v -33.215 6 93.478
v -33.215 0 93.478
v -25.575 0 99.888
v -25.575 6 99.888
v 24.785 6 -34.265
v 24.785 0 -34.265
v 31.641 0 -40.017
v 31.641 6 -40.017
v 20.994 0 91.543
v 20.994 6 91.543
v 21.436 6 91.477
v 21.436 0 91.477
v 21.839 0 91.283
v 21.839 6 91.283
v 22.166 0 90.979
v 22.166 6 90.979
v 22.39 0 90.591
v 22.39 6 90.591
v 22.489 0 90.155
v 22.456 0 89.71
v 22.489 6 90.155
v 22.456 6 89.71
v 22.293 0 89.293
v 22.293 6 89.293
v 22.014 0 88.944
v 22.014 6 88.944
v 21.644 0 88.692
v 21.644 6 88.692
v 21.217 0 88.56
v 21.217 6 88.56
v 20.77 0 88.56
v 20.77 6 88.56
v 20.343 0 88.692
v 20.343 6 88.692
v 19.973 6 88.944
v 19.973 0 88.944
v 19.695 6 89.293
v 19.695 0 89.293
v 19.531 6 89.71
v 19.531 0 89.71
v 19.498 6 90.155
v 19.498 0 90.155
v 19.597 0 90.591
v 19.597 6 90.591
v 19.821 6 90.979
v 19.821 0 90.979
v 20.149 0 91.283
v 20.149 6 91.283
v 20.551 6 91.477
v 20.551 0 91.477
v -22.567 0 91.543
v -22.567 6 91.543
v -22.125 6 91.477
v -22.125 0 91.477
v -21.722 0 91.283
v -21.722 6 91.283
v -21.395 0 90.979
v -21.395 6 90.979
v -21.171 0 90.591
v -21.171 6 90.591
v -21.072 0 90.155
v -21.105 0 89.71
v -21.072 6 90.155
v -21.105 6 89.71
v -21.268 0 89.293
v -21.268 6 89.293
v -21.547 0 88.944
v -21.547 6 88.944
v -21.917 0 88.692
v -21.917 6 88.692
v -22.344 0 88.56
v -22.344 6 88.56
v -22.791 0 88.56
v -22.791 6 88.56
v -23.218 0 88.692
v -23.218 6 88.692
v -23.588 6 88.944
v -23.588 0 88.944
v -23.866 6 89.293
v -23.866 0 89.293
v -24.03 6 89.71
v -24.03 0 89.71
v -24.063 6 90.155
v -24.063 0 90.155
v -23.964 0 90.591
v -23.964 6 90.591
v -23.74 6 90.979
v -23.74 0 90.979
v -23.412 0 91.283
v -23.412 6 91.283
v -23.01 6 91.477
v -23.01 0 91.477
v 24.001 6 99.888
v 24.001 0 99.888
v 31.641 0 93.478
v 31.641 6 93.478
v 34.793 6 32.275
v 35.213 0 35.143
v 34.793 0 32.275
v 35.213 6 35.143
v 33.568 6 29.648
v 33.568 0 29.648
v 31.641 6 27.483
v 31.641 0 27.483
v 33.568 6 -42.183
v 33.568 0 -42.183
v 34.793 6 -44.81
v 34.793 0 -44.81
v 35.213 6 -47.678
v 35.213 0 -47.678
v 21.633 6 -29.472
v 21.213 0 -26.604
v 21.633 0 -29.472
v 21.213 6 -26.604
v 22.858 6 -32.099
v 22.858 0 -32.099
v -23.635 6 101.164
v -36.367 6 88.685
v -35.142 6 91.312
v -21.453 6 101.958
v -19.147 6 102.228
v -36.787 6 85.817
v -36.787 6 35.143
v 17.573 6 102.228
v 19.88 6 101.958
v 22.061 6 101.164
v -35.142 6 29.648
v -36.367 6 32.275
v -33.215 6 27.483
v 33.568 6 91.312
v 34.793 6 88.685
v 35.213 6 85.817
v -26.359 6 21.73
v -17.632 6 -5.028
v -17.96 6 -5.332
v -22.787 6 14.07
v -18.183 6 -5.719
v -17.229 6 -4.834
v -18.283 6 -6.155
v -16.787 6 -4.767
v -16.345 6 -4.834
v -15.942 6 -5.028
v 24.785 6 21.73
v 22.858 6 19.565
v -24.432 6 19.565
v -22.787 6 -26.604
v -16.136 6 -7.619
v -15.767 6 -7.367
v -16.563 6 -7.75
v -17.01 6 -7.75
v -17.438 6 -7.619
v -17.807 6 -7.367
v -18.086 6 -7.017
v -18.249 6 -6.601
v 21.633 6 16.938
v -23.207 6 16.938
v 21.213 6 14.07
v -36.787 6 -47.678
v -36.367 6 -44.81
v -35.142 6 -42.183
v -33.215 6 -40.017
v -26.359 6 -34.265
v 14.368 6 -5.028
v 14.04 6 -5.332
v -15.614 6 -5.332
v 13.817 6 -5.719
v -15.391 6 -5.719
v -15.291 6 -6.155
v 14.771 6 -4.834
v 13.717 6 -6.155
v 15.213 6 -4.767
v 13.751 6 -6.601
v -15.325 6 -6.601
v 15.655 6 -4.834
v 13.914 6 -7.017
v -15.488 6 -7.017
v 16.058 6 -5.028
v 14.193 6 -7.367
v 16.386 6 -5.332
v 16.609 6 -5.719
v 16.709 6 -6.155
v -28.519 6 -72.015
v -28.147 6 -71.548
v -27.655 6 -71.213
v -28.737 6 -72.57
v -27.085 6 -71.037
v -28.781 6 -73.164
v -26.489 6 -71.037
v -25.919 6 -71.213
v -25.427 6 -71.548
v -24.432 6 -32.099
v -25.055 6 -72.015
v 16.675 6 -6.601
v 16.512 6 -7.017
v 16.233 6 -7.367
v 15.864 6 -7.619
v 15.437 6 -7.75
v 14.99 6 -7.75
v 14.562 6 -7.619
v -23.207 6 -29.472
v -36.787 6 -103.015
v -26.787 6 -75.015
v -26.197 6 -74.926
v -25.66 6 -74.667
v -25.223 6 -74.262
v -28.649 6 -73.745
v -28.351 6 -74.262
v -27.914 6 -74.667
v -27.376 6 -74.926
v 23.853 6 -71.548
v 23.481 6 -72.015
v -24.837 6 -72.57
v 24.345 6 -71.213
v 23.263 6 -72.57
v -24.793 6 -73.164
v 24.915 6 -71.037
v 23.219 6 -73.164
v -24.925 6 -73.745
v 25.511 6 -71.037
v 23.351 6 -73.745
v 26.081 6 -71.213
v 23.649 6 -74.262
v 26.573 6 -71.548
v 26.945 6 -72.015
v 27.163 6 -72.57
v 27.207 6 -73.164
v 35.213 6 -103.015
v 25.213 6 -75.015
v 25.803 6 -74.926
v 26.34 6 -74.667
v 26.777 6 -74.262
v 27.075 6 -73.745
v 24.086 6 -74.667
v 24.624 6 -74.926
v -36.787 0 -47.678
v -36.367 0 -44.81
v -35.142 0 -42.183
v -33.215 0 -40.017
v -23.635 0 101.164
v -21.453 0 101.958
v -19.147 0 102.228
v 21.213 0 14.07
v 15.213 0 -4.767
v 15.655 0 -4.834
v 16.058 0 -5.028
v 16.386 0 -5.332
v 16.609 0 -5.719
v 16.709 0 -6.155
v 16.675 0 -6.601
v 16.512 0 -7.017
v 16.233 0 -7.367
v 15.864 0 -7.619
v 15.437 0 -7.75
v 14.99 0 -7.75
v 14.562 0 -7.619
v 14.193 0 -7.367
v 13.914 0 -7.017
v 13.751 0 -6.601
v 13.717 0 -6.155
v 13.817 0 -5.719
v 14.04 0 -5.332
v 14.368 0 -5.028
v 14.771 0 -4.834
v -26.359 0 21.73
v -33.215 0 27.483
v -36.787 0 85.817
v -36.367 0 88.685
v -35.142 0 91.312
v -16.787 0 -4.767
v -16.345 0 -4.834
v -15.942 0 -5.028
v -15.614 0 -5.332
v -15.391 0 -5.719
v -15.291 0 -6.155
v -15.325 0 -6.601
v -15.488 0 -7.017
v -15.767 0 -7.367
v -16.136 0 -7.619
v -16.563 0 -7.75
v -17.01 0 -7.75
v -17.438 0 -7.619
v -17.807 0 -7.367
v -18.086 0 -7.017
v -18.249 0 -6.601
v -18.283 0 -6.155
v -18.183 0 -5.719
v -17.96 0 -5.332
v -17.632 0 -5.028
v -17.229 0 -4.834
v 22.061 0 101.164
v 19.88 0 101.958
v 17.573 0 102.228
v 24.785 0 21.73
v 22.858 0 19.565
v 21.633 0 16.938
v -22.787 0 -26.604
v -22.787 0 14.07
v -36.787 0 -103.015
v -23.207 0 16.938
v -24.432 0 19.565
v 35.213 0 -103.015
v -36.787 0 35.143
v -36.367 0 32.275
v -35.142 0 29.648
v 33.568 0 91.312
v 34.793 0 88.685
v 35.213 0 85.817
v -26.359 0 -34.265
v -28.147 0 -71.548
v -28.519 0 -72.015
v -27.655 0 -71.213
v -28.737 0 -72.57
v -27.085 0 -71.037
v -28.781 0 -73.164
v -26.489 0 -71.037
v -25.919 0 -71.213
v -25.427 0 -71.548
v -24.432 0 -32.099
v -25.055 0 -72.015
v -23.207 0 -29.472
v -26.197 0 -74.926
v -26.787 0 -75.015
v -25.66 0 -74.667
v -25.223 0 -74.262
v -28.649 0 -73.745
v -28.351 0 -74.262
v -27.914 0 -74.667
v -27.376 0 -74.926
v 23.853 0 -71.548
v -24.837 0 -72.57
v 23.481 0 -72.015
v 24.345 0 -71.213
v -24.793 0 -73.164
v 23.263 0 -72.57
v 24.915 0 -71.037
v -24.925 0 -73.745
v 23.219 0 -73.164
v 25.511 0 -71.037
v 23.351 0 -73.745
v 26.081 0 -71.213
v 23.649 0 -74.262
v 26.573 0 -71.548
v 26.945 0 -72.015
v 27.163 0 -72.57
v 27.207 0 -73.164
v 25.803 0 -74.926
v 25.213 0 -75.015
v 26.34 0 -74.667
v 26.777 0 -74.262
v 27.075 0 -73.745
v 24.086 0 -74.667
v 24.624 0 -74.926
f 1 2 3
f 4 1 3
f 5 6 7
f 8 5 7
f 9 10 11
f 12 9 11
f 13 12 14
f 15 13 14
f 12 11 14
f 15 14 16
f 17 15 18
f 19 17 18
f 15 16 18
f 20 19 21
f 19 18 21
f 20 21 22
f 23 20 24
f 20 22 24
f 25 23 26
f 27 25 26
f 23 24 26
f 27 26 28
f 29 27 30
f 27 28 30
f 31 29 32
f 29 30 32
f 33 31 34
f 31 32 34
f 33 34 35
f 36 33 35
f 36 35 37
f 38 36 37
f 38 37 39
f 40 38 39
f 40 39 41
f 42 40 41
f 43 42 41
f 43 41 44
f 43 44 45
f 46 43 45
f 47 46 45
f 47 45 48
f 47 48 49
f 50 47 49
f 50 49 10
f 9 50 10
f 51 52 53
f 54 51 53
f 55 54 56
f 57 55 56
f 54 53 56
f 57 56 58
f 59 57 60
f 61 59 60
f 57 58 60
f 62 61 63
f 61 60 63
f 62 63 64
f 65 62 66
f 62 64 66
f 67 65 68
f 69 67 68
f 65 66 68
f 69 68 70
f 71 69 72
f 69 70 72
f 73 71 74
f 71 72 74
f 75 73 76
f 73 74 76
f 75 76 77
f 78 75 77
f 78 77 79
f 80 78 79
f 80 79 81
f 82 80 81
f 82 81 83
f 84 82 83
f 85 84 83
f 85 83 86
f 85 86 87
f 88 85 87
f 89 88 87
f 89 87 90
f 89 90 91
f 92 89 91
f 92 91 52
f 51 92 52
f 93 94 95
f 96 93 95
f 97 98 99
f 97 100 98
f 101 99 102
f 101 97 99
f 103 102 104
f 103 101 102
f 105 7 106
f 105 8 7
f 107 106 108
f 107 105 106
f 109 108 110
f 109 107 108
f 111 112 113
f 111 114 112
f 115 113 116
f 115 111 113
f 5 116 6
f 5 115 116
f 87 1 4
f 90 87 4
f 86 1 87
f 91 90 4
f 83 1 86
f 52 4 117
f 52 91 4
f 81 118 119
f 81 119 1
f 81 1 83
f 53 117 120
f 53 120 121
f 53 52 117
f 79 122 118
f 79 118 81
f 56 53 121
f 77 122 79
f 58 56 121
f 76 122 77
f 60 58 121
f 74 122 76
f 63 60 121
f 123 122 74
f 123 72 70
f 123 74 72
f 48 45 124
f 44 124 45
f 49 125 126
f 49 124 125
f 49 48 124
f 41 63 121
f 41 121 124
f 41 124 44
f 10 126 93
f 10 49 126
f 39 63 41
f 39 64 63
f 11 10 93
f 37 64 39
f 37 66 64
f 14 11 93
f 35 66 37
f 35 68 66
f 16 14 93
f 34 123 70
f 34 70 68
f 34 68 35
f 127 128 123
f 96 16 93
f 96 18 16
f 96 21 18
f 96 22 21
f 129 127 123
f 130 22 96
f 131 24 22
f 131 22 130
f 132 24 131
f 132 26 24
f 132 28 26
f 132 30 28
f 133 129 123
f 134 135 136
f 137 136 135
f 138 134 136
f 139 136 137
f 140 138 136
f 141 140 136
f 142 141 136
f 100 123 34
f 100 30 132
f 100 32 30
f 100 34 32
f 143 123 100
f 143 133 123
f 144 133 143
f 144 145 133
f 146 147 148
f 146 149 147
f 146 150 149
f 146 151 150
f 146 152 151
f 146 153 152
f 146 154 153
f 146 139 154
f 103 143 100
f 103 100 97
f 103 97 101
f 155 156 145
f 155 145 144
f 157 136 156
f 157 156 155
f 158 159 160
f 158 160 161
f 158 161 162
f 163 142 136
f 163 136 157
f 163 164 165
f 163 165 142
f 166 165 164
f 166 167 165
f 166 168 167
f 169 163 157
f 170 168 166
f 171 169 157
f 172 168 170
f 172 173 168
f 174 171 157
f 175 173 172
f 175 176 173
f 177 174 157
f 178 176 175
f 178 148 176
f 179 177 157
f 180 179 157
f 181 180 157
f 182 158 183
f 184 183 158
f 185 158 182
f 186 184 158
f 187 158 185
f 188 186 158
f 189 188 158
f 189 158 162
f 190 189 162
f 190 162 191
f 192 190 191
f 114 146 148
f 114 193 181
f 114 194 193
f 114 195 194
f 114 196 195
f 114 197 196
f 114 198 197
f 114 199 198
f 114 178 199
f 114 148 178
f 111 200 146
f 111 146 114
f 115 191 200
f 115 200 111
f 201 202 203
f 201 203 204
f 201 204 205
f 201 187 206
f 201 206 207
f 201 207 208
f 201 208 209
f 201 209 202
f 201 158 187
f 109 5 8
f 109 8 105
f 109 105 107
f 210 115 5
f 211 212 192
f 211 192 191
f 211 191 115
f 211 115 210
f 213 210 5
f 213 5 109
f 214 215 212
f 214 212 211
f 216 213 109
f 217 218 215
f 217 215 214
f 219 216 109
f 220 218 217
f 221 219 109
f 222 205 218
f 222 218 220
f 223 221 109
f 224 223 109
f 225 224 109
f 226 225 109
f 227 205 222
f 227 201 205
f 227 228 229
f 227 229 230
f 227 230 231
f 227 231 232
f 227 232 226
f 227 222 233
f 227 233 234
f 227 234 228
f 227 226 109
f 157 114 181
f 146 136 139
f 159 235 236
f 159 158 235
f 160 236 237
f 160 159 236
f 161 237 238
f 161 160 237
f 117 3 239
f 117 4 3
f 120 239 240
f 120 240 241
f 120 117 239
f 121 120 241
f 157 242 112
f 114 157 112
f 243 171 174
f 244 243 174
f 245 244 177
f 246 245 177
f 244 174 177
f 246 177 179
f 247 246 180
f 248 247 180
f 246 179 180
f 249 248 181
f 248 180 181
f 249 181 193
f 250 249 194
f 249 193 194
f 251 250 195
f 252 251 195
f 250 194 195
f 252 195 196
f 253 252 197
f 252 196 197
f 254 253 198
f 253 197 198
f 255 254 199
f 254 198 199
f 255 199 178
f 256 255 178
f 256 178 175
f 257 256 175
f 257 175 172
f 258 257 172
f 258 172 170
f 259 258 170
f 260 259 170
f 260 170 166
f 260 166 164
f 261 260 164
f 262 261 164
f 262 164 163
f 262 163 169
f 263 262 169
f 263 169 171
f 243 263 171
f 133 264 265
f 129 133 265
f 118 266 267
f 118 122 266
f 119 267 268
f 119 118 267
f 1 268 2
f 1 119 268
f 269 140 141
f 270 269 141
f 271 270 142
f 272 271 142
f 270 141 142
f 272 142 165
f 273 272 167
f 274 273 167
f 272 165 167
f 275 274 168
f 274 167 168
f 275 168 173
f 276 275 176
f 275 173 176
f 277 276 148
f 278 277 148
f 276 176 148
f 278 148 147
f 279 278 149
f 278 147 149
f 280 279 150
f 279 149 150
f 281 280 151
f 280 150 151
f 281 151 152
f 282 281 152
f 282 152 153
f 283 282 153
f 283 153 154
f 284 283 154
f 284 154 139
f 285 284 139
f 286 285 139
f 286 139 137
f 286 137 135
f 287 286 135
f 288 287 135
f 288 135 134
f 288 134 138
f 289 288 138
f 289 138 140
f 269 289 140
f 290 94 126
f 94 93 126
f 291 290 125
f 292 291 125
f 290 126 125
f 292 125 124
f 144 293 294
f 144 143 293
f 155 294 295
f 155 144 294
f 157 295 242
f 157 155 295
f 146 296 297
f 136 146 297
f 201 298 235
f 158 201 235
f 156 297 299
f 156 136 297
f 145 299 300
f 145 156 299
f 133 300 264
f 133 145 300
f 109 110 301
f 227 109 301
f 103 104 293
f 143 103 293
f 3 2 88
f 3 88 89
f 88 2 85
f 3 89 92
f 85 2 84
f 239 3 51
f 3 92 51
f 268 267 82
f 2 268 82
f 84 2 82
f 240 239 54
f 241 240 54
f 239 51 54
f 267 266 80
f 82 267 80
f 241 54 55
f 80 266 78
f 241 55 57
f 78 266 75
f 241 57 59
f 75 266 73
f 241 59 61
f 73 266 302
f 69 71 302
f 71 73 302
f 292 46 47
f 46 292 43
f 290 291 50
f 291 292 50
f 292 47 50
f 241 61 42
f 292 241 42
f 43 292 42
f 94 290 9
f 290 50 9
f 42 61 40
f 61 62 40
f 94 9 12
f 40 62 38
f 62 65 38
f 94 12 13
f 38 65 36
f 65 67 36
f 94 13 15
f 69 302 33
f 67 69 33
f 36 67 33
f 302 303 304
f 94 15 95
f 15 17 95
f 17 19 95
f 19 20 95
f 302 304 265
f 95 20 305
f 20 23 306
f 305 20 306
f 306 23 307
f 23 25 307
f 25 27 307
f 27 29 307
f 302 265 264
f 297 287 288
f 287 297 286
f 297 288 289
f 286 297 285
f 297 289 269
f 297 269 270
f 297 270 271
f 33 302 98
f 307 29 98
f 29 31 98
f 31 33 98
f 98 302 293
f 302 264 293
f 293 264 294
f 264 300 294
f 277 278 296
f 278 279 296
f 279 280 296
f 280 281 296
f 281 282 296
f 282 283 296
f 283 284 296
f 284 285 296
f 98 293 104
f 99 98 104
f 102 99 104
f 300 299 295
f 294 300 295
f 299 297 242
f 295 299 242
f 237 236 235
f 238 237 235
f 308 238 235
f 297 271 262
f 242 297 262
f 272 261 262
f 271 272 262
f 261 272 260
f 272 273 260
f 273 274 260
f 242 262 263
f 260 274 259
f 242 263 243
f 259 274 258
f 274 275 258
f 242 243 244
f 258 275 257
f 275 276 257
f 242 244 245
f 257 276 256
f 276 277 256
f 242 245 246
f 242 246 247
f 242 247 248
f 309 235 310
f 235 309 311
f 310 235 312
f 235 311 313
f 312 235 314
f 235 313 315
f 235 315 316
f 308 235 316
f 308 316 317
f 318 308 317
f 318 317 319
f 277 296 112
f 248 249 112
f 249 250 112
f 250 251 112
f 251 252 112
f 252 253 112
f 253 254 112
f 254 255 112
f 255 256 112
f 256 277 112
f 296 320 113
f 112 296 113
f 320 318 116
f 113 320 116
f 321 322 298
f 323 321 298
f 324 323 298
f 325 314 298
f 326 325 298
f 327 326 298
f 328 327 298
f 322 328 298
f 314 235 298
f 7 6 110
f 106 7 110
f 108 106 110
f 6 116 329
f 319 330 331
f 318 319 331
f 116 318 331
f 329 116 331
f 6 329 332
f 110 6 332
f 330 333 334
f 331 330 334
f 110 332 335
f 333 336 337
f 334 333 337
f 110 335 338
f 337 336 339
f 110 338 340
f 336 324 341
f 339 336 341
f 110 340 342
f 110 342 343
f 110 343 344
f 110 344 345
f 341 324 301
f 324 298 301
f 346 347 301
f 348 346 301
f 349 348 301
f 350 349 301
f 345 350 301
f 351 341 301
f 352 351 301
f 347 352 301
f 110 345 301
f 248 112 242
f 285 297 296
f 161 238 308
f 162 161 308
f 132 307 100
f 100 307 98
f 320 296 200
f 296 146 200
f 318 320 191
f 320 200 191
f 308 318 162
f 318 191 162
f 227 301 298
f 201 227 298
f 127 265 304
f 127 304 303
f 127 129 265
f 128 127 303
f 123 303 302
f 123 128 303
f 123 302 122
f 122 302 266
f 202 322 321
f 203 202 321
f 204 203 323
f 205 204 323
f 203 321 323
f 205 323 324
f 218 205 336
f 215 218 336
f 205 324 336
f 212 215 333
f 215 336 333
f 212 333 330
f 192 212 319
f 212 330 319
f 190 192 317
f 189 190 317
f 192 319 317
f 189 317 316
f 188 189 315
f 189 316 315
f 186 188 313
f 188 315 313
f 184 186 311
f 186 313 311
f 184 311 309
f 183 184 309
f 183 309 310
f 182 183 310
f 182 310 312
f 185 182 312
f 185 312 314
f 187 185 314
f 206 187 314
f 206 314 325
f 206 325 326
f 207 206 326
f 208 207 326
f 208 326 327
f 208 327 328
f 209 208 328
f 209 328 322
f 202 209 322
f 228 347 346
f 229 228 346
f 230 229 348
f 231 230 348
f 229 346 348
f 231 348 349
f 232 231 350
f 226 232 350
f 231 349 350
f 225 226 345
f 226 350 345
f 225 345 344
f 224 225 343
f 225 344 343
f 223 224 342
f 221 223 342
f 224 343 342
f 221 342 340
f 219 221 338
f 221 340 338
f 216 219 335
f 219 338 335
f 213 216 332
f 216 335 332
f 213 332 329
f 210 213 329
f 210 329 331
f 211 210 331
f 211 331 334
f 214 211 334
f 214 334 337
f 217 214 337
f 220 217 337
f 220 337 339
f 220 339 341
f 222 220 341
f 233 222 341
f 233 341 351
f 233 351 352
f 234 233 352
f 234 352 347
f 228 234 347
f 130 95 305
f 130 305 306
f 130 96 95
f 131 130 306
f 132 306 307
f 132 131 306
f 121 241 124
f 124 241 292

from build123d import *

# Parameters (mm, degrees)
BOSS_EXTRUDE1_DEPTH = 6
FILLET1_R           = 10
SKETCH2_R           = 2.5
CUT_EXTRUDE1_DEPTH  = 6
SKETCH5_R           = 5.997593501
BOSS_EXTRUDE2_DEPTH = 6
FILLET2_R           = 10
SKETCH6_R           = 1.5
CUT_EXTRUDE2_DEPTH  = 10
SKETCH7_R           = 1.5
CUT_EXTRUDE3_DEPTH  = 10
SKETCH8_R           = 2
CUT_EXTRUDE4_DEPTH  = 10


with BuildPart() as part:
    # Sketch1 → Boss-Extrude1 (new body)
    with BuildSketch(Plane(origin=(0, 0, 0), x_dir=(1, 0, 0), z_dir=(0, 1, 0))):
        Polygon((21.213083016, -102.227633762), (35.213083016, -90.480238926), (35.213083016, -30.480238926), (21.213083016, -18.73284409), (21.213083016, 31.26715591), (35.213083016, 43.014550747), (35.213083016, 103.014550747), (-36.786916984, 103.014550747), (-36.786916984, 43.014550747), (-22.786916984, 31.26715591), (-22.786916984, -18.73284409), (-36.786916984, -30.480238926), (-36.786916984, -90.480238926), (-22.786916984, -102.227633762), align=None)
    extrude(amount=BOSS_EXTRUDE1_DEPTH)

    # Fillet1
    fillet1_edges = [part.edges().sort_by_distance(p)[0] for p in [
        (-22.786916984, 3, 102.227633762),
        (-36.786916984, 3, 90.480238926),
        (-36.786916984, 3, 30.480238926),
        (-22.786916984, 3, 18.73284409),
        (21.213083016, 3, 18.73284409),
        (35.213083016, 3, 30.480238926),
        (35.213083016, 3, 90.480238926),
        (21.213083016, 3, 102.227633762),
    ]]
    fillet(fillet1_edges, radius=FILLET1_R)

    # Sketch2 → Cut-Extrude1 (cut)
    with BuildSketch(Plane.XZ):
        with Locations(Location((-0.786916984, 60.480238926, 0), (0, 0, 270))):
            Circle(SKETCH2_R)
    extrude(amount=-CUT_EXTRUDE1_DEPTH, mode=Mode.SUBTRACT)

    # Sketch5 → Boss-Extrude2 (add)
    with BuildSketch(Plane.XZ):
        with Locations((-0.786916984, 60.480238926)):
            Circle(SKETCH5_R)
    extrude(amount=-BOSS_EXTRUDE2_DEPTH)

    # Fillet2
    fillet2_edges = [part.edges().sort_by_distance(p)[0] for p in [
        (-22.786916984, 3, -31.26715591),
        (-36.786916984, 3, -43.014550747),
        (35.213083016, 3, -43.014550747),
        (21.213083016, 3, -31.26715591),
    ]]
    fillet(fillet2_edges, radius=FILLET2_R)

    # Sketch6 → Cut-Extrude2 (cut)
    with BuildSketch(Plane(origin=(0, 6, 0), x_dir=(1, 0, 0), z_dir=(0, 1, 0))):
        with Locations(Location((15.213083016, 6.26715591, 0), (0, 0, 270))):
            Circle(SKETCH6_R)
        with Locations(Location((-16.786916984, 6.26715591, 0), (0, 0, 270))):
            Circle(SKETCH6_R)
    extrude(amount=-CUT_EXTRUDE2_DEPTH, mode=Mode.SUBTRACT)

    # Sketch7 → Cut-Extrude3 (cut)
    with BuildSketch(Plane(origin=(0, 6, 0), x_dir=(1, 0, 0), z_dir=(0, 1, 0))):
        with Locations(Location((20.993582106, -90.043344962, 0), (0, 0, 270))):
            Circle(SKETCH7_R)
        with Locations(Location((-22.567416075, -90.043344962, 0), (0, 0, 270))):
            Circle(SKETCH7_R)
    extrude(amount=-CUT_EXTRUDE3_DEPTH, mode=Mode.SUBTRACT)

    # Sketch8 → Cut-Extrude4 (cut)
    with BuildSketch(Plane(origin=(0, 0, 0), x_dir=(-1, 0, 0), z_dir=(0, -1, 0))):
        with Locations(Location((26.786916984, 73.014550747, 0), (0, 0, 90))):
            Circle(SKETCH8_R)
        with Locations(Location((-25.213083016, 73.014550747, 0), (0, 0, 90))):
            Circle(SKETCH8_R)
    extrude(amount=-CUT_EXTRUDE4_DEPTH, mode=Mode.SUBTRACT)


solid = part.part
